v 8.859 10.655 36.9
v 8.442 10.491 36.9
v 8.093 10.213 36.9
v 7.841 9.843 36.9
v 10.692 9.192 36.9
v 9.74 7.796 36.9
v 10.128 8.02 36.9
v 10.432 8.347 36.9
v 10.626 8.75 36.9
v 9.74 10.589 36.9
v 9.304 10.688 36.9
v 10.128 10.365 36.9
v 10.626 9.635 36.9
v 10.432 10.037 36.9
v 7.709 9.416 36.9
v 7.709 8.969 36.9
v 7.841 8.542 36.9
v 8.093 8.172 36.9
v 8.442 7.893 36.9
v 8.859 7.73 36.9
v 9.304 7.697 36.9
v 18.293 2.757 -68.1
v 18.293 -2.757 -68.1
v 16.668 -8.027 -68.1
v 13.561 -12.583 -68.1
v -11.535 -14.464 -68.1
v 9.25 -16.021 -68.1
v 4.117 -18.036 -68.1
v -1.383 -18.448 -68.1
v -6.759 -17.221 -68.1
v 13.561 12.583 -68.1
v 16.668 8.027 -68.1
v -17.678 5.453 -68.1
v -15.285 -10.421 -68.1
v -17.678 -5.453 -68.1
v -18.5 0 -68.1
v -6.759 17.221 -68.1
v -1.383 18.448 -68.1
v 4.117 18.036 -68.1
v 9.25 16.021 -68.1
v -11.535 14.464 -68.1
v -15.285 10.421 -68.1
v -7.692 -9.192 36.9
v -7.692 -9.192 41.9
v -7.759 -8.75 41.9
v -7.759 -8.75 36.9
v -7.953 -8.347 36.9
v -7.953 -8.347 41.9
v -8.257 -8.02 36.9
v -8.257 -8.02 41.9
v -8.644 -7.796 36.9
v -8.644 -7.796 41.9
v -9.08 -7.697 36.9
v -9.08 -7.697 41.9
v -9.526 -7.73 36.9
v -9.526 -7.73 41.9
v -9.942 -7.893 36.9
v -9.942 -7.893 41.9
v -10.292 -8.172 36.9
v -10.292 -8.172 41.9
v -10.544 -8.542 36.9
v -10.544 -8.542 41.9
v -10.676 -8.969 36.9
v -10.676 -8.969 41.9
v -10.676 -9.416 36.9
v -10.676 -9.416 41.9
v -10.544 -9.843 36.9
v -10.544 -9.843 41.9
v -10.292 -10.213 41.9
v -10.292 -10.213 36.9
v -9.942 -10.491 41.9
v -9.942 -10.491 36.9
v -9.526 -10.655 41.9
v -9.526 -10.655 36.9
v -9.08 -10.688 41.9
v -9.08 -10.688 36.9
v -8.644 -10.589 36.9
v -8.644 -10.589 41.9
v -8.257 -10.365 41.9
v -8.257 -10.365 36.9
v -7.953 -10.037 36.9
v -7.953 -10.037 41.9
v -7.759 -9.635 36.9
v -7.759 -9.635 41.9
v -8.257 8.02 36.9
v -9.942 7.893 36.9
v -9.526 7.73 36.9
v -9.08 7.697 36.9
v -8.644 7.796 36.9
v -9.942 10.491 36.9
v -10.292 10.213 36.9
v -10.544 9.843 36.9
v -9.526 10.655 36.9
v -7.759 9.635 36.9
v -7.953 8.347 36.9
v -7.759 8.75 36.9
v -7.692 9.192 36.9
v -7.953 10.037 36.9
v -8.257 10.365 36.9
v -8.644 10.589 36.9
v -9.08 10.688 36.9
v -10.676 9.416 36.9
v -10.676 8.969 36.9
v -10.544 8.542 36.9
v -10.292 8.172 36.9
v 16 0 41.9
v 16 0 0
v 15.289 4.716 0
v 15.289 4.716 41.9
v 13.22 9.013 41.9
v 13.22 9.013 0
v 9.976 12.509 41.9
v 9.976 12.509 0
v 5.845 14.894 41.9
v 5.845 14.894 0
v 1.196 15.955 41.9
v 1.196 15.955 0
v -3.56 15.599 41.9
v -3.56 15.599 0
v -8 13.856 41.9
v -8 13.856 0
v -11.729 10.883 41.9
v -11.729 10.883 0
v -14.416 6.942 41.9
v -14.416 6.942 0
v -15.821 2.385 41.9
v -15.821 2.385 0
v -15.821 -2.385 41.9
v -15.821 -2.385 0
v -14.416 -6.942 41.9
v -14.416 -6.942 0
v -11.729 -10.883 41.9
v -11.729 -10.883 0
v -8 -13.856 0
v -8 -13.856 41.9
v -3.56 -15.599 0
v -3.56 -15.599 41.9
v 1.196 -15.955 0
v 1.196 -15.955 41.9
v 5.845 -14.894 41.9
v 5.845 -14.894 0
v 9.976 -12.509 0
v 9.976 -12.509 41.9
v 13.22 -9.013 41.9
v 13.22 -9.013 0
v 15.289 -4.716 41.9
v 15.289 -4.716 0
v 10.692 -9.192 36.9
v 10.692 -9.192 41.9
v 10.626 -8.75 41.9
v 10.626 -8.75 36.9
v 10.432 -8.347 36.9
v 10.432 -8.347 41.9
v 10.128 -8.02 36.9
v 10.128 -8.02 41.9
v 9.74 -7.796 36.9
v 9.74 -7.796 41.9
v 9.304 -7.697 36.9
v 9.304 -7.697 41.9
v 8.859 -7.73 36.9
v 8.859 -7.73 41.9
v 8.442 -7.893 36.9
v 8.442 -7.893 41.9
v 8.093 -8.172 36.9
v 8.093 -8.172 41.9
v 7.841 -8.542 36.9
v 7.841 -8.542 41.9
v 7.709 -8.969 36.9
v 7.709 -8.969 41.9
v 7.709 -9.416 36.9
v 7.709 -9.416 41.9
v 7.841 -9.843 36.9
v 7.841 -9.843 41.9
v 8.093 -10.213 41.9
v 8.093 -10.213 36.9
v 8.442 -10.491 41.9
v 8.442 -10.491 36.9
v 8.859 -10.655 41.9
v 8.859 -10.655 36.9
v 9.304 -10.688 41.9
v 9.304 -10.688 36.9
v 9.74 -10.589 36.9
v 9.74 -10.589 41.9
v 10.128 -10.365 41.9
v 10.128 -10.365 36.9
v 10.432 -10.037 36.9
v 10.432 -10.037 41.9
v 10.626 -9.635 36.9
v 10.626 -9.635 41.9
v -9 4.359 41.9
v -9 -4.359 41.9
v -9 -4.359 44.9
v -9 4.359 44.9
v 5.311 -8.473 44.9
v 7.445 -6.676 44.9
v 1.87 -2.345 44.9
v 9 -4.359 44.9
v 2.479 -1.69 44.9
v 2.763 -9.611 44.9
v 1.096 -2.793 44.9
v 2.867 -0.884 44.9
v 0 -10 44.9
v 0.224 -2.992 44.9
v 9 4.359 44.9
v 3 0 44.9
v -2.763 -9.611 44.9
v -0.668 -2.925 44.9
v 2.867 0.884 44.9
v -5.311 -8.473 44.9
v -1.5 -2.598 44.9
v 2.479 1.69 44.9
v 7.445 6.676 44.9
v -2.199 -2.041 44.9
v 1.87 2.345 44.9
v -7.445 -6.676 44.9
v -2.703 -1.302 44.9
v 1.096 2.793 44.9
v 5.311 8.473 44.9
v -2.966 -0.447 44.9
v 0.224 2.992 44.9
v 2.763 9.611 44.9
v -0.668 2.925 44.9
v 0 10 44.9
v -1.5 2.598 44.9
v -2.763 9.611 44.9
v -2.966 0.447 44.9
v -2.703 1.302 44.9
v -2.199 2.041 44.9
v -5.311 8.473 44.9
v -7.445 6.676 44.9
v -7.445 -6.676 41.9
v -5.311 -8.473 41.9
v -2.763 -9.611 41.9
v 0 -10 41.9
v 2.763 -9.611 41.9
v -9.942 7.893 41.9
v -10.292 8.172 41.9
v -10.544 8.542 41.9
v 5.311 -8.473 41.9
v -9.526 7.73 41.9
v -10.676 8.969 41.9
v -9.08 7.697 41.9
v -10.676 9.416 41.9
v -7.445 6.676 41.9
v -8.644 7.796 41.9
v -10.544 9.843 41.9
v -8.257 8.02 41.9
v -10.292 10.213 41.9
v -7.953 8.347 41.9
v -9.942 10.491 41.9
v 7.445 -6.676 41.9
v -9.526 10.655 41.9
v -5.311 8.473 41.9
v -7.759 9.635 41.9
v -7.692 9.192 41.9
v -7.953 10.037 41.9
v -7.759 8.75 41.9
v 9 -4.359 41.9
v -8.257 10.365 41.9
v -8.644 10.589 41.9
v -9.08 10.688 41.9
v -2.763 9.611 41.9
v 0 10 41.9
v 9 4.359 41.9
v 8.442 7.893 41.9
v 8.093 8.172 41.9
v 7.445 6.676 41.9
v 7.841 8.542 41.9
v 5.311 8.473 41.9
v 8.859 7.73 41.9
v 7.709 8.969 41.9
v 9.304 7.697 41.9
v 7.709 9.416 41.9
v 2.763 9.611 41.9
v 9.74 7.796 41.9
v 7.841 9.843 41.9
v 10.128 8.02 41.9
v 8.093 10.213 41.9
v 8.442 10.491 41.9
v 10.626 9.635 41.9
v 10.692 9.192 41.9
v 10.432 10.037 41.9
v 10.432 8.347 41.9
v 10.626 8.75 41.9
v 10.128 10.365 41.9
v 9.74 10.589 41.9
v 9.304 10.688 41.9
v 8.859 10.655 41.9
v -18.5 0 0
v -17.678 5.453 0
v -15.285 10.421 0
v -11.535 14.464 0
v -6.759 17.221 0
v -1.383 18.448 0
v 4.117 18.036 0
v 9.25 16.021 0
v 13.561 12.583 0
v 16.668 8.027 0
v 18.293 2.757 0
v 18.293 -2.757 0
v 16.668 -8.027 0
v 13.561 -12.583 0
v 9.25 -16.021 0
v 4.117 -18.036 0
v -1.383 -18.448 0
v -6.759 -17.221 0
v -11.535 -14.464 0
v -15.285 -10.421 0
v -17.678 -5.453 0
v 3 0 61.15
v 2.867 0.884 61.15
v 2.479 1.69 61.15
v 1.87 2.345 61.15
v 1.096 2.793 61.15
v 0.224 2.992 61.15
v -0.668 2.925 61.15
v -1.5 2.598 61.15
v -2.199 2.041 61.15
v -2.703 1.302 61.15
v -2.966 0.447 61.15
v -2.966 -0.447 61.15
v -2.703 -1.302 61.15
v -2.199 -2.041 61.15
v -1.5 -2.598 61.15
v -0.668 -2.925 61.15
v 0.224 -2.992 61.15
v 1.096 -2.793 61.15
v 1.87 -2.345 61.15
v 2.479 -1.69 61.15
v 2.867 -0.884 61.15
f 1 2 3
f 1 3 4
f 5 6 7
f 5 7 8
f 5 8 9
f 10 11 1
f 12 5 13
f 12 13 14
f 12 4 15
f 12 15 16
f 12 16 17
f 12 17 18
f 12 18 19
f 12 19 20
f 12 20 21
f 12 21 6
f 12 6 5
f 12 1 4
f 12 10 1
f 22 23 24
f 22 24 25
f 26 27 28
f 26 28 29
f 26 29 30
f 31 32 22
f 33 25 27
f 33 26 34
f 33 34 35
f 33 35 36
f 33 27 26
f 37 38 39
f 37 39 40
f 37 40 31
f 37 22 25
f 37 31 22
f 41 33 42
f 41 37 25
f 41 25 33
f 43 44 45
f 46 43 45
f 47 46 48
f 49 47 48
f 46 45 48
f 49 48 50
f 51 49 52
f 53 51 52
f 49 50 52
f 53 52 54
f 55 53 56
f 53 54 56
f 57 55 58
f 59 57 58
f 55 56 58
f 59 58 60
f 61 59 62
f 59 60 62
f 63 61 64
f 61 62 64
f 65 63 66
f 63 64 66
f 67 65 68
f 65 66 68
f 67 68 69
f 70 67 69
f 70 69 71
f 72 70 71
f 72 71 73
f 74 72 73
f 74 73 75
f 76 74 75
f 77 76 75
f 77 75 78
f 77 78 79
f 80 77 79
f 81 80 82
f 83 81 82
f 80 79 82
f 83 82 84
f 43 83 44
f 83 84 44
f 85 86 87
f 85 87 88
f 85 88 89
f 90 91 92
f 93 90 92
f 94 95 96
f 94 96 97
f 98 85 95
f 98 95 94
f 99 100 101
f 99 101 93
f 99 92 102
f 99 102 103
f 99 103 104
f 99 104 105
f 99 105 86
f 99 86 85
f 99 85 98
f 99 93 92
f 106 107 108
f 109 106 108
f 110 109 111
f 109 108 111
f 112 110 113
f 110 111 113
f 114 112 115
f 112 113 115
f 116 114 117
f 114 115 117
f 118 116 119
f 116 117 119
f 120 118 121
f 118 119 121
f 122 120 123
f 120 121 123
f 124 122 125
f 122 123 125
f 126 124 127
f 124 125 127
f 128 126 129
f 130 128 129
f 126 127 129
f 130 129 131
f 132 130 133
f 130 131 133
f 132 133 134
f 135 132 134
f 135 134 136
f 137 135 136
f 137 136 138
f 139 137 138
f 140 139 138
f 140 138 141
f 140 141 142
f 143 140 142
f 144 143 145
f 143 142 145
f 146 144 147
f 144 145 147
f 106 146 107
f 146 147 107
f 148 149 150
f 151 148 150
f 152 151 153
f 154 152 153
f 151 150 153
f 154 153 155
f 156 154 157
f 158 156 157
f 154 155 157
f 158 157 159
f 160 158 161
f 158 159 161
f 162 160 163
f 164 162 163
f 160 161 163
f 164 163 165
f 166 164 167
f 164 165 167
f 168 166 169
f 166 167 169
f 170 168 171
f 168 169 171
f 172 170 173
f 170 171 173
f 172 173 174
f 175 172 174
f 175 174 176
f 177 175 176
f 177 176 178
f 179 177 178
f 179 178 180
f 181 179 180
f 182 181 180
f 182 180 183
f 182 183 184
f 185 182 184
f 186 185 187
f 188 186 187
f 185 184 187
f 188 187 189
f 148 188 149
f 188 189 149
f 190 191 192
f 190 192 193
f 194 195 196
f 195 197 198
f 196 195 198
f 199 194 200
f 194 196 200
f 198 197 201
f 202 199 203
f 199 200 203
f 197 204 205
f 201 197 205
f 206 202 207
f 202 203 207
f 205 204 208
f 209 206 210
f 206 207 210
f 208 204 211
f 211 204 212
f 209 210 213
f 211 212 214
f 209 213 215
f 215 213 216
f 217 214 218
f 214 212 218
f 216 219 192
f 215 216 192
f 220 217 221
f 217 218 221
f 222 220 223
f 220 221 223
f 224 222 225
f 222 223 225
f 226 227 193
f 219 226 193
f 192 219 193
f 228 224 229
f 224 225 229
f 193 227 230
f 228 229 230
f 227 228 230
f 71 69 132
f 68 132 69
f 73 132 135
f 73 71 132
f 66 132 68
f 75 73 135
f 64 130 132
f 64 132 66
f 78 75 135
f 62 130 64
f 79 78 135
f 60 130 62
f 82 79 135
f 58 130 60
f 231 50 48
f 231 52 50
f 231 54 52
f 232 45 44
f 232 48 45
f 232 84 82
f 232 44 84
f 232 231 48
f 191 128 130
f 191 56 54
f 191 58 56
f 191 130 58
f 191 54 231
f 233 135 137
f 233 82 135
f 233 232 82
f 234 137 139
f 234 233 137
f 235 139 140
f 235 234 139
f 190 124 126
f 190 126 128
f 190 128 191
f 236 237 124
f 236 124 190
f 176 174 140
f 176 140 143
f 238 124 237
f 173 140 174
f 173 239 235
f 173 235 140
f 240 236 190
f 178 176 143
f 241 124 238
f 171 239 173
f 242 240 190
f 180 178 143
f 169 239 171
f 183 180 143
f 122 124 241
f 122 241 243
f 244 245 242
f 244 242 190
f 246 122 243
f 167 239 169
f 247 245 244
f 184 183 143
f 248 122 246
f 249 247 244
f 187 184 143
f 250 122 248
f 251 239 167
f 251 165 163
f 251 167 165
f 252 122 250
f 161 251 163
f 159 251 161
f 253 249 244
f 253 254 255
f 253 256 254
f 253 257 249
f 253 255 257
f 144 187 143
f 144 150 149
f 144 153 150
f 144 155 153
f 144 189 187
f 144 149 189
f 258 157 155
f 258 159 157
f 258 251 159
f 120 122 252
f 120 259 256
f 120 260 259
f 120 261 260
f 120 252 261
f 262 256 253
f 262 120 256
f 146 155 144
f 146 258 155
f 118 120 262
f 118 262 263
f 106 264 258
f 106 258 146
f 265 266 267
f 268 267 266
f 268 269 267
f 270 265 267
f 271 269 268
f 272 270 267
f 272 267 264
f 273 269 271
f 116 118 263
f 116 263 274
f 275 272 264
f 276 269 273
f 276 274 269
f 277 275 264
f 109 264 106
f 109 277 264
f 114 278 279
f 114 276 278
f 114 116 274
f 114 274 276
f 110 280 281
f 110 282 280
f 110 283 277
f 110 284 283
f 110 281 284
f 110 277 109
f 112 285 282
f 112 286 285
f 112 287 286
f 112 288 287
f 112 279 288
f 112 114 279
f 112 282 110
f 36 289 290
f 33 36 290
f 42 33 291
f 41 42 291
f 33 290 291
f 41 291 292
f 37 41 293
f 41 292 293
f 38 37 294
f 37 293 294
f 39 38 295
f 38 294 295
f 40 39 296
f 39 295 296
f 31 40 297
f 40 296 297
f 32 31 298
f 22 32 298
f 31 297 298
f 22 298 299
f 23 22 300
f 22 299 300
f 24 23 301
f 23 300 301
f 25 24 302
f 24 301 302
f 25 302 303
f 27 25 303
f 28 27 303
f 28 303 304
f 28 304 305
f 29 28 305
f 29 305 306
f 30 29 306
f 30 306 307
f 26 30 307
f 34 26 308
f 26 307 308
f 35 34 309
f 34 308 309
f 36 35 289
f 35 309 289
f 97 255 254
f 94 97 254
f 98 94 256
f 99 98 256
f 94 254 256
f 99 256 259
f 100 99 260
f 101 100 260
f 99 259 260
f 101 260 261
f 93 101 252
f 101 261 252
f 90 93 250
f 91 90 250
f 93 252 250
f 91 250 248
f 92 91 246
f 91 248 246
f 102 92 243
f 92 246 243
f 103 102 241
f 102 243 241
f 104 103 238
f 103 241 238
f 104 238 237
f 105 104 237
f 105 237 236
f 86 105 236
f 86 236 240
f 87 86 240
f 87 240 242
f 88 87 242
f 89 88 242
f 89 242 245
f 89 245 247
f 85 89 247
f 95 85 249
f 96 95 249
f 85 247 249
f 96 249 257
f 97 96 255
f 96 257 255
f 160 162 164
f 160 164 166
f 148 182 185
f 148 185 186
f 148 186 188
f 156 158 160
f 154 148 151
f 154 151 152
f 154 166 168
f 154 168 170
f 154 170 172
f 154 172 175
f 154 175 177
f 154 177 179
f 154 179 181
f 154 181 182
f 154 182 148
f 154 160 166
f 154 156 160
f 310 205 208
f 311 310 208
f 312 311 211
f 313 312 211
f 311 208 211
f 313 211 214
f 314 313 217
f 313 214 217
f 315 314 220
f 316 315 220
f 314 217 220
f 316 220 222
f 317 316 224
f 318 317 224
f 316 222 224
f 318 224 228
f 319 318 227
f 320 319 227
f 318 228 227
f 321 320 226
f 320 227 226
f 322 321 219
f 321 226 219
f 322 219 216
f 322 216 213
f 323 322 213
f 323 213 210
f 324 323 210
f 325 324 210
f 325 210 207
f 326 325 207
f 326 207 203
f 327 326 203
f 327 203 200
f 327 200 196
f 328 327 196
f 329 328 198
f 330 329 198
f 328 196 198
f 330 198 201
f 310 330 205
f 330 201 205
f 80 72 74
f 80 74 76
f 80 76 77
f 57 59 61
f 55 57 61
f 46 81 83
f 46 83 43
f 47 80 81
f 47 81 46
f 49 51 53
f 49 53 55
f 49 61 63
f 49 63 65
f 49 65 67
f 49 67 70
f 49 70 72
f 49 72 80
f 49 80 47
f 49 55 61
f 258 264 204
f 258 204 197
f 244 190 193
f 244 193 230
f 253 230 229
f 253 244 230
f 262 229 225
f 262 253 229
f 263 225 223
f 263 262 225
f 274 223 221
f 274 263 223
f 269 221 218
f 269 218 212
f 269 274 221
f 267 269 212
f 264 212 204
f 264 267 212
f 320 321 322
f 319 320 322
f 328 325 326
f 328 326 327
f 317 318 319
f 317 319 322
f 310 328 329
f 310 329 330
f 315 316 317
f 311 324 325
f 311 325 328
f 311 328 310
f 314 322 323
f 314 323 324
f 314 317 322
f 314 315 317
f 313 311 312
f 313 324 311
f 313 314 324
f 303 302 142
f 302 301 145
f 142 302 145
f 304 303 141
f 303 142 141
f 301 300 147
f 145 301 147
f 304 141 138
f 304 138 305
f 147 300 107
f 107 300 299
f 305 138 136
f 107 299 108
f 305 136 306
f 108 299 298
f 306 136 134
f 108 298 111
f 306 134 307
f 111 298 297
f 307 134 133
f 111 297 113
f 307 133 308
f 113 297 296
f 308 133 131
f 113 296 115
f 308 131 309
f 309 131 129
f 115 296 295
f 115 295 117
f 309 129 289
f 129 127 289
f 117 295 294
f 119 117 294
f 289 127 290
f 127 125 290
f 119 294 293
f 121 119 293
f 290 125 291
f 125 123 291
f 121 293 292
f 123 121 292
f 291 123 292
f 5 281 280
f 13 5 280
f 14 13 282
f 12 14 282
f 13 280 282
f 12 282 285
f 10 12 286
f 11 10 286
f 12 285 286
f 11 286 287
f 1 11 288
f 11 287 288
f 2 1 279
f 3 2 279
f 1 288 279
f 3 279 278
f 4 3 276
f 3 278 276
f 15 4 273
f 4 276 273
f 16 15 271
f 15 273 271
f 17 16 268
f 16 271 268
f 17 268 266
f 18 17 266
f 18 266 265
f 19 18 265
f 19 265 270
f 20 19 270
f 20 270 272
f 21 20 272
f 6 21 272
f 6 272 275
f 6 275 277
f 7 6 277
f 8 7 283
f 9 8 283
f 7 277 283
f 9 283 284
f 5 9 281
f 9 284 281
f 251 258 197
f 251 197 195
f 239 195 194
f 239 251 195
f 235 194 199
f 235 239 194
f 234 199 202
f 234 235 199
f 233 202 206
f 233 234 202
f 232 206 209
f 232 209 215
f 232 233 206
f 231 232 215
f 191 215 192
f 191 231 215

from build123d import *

# Parameters (mm, degrees)
SKETCH1_R           = 16
BOSS_EXTRUDE1_DEPTH = 41.9
SKETCH2_R           = 1.5
CUT_EXTRUDE1_DEPTH  = 5
BOSS_EXTRUDE2_DEPTH = 3
SKETCH4_R           = 3
BOSS_EXTRUDE3_DEPTH = 16.25
SKETCH5_R           = 18.5
BOSS_EXTRUDE4_DEPTH = 68.1


with BuildPart() as part:
    # Sketch1 → Boss-Extrude1 (new body)
    with BuildSketch(Plane.XY):
        Circle(SKETCH1_R)
    extrude(amount=BOSS_EXTRUDE1_DEPTH)

    # Sketch2 → Cut-Extrude1 (cut)
    with BuildSketch(Plane.XY.offset(41.9)):
        with Locations((-9.192388155, 9.192388155)):
            Circle(SKETCH2_R)
        with Locations((9.192388155, 9.192388155)):
            Circle(SKETCH2_R)
        with Locations((9.192388155, -9.192388155)):
            Circle(SKETCH2_R)
        with Locations((-9.192388155, -9.192388155)):
            Circle(SKETCH2_R)
    extrude(amount=-CUT_EXTRUDE1_DEPTH, mode=Mode.SUBTRACT)

    # Sketch3 → Boss-Extrude2 (add)
    with BuildSketch(Plane.XY.offset(41.9)):
        with BuildLine():
            Line((9, 4.358898944), (9, -4.358898944))
            ThreePointArc((9, -4.358898944), (0, -10), (-9, -4.358898944))
            Line((-9, -4.358898944), (-9, 4.358898944))
            ThreePointArc((-9, 4.358898944), (0, 10), (9, 4.358898944))
        make_face()
    extrude(amount=BOSS_EXTRUDE2_DEPTH)

    # Sketch4 → Boss-Extrude3 (add)
    with BuildSketch(Plane.XY.offset(44.9)):
        Circle(SKETCH4_R)
    extrude(amount=BOSS_EXTRUDE3_DEPTH)

    # Sketch5 → Boss-Extrude4 (add)
    with BuildSketch(Plane(origin=(0, 0, 0), x_dir=(-1, 0, 0), z_dir=(0, 0, -1))):
        Circle(SKETCH5_R)
    extrude(amount=BOSS_EXTRUDE4_DEPTH)


solid = part.part
